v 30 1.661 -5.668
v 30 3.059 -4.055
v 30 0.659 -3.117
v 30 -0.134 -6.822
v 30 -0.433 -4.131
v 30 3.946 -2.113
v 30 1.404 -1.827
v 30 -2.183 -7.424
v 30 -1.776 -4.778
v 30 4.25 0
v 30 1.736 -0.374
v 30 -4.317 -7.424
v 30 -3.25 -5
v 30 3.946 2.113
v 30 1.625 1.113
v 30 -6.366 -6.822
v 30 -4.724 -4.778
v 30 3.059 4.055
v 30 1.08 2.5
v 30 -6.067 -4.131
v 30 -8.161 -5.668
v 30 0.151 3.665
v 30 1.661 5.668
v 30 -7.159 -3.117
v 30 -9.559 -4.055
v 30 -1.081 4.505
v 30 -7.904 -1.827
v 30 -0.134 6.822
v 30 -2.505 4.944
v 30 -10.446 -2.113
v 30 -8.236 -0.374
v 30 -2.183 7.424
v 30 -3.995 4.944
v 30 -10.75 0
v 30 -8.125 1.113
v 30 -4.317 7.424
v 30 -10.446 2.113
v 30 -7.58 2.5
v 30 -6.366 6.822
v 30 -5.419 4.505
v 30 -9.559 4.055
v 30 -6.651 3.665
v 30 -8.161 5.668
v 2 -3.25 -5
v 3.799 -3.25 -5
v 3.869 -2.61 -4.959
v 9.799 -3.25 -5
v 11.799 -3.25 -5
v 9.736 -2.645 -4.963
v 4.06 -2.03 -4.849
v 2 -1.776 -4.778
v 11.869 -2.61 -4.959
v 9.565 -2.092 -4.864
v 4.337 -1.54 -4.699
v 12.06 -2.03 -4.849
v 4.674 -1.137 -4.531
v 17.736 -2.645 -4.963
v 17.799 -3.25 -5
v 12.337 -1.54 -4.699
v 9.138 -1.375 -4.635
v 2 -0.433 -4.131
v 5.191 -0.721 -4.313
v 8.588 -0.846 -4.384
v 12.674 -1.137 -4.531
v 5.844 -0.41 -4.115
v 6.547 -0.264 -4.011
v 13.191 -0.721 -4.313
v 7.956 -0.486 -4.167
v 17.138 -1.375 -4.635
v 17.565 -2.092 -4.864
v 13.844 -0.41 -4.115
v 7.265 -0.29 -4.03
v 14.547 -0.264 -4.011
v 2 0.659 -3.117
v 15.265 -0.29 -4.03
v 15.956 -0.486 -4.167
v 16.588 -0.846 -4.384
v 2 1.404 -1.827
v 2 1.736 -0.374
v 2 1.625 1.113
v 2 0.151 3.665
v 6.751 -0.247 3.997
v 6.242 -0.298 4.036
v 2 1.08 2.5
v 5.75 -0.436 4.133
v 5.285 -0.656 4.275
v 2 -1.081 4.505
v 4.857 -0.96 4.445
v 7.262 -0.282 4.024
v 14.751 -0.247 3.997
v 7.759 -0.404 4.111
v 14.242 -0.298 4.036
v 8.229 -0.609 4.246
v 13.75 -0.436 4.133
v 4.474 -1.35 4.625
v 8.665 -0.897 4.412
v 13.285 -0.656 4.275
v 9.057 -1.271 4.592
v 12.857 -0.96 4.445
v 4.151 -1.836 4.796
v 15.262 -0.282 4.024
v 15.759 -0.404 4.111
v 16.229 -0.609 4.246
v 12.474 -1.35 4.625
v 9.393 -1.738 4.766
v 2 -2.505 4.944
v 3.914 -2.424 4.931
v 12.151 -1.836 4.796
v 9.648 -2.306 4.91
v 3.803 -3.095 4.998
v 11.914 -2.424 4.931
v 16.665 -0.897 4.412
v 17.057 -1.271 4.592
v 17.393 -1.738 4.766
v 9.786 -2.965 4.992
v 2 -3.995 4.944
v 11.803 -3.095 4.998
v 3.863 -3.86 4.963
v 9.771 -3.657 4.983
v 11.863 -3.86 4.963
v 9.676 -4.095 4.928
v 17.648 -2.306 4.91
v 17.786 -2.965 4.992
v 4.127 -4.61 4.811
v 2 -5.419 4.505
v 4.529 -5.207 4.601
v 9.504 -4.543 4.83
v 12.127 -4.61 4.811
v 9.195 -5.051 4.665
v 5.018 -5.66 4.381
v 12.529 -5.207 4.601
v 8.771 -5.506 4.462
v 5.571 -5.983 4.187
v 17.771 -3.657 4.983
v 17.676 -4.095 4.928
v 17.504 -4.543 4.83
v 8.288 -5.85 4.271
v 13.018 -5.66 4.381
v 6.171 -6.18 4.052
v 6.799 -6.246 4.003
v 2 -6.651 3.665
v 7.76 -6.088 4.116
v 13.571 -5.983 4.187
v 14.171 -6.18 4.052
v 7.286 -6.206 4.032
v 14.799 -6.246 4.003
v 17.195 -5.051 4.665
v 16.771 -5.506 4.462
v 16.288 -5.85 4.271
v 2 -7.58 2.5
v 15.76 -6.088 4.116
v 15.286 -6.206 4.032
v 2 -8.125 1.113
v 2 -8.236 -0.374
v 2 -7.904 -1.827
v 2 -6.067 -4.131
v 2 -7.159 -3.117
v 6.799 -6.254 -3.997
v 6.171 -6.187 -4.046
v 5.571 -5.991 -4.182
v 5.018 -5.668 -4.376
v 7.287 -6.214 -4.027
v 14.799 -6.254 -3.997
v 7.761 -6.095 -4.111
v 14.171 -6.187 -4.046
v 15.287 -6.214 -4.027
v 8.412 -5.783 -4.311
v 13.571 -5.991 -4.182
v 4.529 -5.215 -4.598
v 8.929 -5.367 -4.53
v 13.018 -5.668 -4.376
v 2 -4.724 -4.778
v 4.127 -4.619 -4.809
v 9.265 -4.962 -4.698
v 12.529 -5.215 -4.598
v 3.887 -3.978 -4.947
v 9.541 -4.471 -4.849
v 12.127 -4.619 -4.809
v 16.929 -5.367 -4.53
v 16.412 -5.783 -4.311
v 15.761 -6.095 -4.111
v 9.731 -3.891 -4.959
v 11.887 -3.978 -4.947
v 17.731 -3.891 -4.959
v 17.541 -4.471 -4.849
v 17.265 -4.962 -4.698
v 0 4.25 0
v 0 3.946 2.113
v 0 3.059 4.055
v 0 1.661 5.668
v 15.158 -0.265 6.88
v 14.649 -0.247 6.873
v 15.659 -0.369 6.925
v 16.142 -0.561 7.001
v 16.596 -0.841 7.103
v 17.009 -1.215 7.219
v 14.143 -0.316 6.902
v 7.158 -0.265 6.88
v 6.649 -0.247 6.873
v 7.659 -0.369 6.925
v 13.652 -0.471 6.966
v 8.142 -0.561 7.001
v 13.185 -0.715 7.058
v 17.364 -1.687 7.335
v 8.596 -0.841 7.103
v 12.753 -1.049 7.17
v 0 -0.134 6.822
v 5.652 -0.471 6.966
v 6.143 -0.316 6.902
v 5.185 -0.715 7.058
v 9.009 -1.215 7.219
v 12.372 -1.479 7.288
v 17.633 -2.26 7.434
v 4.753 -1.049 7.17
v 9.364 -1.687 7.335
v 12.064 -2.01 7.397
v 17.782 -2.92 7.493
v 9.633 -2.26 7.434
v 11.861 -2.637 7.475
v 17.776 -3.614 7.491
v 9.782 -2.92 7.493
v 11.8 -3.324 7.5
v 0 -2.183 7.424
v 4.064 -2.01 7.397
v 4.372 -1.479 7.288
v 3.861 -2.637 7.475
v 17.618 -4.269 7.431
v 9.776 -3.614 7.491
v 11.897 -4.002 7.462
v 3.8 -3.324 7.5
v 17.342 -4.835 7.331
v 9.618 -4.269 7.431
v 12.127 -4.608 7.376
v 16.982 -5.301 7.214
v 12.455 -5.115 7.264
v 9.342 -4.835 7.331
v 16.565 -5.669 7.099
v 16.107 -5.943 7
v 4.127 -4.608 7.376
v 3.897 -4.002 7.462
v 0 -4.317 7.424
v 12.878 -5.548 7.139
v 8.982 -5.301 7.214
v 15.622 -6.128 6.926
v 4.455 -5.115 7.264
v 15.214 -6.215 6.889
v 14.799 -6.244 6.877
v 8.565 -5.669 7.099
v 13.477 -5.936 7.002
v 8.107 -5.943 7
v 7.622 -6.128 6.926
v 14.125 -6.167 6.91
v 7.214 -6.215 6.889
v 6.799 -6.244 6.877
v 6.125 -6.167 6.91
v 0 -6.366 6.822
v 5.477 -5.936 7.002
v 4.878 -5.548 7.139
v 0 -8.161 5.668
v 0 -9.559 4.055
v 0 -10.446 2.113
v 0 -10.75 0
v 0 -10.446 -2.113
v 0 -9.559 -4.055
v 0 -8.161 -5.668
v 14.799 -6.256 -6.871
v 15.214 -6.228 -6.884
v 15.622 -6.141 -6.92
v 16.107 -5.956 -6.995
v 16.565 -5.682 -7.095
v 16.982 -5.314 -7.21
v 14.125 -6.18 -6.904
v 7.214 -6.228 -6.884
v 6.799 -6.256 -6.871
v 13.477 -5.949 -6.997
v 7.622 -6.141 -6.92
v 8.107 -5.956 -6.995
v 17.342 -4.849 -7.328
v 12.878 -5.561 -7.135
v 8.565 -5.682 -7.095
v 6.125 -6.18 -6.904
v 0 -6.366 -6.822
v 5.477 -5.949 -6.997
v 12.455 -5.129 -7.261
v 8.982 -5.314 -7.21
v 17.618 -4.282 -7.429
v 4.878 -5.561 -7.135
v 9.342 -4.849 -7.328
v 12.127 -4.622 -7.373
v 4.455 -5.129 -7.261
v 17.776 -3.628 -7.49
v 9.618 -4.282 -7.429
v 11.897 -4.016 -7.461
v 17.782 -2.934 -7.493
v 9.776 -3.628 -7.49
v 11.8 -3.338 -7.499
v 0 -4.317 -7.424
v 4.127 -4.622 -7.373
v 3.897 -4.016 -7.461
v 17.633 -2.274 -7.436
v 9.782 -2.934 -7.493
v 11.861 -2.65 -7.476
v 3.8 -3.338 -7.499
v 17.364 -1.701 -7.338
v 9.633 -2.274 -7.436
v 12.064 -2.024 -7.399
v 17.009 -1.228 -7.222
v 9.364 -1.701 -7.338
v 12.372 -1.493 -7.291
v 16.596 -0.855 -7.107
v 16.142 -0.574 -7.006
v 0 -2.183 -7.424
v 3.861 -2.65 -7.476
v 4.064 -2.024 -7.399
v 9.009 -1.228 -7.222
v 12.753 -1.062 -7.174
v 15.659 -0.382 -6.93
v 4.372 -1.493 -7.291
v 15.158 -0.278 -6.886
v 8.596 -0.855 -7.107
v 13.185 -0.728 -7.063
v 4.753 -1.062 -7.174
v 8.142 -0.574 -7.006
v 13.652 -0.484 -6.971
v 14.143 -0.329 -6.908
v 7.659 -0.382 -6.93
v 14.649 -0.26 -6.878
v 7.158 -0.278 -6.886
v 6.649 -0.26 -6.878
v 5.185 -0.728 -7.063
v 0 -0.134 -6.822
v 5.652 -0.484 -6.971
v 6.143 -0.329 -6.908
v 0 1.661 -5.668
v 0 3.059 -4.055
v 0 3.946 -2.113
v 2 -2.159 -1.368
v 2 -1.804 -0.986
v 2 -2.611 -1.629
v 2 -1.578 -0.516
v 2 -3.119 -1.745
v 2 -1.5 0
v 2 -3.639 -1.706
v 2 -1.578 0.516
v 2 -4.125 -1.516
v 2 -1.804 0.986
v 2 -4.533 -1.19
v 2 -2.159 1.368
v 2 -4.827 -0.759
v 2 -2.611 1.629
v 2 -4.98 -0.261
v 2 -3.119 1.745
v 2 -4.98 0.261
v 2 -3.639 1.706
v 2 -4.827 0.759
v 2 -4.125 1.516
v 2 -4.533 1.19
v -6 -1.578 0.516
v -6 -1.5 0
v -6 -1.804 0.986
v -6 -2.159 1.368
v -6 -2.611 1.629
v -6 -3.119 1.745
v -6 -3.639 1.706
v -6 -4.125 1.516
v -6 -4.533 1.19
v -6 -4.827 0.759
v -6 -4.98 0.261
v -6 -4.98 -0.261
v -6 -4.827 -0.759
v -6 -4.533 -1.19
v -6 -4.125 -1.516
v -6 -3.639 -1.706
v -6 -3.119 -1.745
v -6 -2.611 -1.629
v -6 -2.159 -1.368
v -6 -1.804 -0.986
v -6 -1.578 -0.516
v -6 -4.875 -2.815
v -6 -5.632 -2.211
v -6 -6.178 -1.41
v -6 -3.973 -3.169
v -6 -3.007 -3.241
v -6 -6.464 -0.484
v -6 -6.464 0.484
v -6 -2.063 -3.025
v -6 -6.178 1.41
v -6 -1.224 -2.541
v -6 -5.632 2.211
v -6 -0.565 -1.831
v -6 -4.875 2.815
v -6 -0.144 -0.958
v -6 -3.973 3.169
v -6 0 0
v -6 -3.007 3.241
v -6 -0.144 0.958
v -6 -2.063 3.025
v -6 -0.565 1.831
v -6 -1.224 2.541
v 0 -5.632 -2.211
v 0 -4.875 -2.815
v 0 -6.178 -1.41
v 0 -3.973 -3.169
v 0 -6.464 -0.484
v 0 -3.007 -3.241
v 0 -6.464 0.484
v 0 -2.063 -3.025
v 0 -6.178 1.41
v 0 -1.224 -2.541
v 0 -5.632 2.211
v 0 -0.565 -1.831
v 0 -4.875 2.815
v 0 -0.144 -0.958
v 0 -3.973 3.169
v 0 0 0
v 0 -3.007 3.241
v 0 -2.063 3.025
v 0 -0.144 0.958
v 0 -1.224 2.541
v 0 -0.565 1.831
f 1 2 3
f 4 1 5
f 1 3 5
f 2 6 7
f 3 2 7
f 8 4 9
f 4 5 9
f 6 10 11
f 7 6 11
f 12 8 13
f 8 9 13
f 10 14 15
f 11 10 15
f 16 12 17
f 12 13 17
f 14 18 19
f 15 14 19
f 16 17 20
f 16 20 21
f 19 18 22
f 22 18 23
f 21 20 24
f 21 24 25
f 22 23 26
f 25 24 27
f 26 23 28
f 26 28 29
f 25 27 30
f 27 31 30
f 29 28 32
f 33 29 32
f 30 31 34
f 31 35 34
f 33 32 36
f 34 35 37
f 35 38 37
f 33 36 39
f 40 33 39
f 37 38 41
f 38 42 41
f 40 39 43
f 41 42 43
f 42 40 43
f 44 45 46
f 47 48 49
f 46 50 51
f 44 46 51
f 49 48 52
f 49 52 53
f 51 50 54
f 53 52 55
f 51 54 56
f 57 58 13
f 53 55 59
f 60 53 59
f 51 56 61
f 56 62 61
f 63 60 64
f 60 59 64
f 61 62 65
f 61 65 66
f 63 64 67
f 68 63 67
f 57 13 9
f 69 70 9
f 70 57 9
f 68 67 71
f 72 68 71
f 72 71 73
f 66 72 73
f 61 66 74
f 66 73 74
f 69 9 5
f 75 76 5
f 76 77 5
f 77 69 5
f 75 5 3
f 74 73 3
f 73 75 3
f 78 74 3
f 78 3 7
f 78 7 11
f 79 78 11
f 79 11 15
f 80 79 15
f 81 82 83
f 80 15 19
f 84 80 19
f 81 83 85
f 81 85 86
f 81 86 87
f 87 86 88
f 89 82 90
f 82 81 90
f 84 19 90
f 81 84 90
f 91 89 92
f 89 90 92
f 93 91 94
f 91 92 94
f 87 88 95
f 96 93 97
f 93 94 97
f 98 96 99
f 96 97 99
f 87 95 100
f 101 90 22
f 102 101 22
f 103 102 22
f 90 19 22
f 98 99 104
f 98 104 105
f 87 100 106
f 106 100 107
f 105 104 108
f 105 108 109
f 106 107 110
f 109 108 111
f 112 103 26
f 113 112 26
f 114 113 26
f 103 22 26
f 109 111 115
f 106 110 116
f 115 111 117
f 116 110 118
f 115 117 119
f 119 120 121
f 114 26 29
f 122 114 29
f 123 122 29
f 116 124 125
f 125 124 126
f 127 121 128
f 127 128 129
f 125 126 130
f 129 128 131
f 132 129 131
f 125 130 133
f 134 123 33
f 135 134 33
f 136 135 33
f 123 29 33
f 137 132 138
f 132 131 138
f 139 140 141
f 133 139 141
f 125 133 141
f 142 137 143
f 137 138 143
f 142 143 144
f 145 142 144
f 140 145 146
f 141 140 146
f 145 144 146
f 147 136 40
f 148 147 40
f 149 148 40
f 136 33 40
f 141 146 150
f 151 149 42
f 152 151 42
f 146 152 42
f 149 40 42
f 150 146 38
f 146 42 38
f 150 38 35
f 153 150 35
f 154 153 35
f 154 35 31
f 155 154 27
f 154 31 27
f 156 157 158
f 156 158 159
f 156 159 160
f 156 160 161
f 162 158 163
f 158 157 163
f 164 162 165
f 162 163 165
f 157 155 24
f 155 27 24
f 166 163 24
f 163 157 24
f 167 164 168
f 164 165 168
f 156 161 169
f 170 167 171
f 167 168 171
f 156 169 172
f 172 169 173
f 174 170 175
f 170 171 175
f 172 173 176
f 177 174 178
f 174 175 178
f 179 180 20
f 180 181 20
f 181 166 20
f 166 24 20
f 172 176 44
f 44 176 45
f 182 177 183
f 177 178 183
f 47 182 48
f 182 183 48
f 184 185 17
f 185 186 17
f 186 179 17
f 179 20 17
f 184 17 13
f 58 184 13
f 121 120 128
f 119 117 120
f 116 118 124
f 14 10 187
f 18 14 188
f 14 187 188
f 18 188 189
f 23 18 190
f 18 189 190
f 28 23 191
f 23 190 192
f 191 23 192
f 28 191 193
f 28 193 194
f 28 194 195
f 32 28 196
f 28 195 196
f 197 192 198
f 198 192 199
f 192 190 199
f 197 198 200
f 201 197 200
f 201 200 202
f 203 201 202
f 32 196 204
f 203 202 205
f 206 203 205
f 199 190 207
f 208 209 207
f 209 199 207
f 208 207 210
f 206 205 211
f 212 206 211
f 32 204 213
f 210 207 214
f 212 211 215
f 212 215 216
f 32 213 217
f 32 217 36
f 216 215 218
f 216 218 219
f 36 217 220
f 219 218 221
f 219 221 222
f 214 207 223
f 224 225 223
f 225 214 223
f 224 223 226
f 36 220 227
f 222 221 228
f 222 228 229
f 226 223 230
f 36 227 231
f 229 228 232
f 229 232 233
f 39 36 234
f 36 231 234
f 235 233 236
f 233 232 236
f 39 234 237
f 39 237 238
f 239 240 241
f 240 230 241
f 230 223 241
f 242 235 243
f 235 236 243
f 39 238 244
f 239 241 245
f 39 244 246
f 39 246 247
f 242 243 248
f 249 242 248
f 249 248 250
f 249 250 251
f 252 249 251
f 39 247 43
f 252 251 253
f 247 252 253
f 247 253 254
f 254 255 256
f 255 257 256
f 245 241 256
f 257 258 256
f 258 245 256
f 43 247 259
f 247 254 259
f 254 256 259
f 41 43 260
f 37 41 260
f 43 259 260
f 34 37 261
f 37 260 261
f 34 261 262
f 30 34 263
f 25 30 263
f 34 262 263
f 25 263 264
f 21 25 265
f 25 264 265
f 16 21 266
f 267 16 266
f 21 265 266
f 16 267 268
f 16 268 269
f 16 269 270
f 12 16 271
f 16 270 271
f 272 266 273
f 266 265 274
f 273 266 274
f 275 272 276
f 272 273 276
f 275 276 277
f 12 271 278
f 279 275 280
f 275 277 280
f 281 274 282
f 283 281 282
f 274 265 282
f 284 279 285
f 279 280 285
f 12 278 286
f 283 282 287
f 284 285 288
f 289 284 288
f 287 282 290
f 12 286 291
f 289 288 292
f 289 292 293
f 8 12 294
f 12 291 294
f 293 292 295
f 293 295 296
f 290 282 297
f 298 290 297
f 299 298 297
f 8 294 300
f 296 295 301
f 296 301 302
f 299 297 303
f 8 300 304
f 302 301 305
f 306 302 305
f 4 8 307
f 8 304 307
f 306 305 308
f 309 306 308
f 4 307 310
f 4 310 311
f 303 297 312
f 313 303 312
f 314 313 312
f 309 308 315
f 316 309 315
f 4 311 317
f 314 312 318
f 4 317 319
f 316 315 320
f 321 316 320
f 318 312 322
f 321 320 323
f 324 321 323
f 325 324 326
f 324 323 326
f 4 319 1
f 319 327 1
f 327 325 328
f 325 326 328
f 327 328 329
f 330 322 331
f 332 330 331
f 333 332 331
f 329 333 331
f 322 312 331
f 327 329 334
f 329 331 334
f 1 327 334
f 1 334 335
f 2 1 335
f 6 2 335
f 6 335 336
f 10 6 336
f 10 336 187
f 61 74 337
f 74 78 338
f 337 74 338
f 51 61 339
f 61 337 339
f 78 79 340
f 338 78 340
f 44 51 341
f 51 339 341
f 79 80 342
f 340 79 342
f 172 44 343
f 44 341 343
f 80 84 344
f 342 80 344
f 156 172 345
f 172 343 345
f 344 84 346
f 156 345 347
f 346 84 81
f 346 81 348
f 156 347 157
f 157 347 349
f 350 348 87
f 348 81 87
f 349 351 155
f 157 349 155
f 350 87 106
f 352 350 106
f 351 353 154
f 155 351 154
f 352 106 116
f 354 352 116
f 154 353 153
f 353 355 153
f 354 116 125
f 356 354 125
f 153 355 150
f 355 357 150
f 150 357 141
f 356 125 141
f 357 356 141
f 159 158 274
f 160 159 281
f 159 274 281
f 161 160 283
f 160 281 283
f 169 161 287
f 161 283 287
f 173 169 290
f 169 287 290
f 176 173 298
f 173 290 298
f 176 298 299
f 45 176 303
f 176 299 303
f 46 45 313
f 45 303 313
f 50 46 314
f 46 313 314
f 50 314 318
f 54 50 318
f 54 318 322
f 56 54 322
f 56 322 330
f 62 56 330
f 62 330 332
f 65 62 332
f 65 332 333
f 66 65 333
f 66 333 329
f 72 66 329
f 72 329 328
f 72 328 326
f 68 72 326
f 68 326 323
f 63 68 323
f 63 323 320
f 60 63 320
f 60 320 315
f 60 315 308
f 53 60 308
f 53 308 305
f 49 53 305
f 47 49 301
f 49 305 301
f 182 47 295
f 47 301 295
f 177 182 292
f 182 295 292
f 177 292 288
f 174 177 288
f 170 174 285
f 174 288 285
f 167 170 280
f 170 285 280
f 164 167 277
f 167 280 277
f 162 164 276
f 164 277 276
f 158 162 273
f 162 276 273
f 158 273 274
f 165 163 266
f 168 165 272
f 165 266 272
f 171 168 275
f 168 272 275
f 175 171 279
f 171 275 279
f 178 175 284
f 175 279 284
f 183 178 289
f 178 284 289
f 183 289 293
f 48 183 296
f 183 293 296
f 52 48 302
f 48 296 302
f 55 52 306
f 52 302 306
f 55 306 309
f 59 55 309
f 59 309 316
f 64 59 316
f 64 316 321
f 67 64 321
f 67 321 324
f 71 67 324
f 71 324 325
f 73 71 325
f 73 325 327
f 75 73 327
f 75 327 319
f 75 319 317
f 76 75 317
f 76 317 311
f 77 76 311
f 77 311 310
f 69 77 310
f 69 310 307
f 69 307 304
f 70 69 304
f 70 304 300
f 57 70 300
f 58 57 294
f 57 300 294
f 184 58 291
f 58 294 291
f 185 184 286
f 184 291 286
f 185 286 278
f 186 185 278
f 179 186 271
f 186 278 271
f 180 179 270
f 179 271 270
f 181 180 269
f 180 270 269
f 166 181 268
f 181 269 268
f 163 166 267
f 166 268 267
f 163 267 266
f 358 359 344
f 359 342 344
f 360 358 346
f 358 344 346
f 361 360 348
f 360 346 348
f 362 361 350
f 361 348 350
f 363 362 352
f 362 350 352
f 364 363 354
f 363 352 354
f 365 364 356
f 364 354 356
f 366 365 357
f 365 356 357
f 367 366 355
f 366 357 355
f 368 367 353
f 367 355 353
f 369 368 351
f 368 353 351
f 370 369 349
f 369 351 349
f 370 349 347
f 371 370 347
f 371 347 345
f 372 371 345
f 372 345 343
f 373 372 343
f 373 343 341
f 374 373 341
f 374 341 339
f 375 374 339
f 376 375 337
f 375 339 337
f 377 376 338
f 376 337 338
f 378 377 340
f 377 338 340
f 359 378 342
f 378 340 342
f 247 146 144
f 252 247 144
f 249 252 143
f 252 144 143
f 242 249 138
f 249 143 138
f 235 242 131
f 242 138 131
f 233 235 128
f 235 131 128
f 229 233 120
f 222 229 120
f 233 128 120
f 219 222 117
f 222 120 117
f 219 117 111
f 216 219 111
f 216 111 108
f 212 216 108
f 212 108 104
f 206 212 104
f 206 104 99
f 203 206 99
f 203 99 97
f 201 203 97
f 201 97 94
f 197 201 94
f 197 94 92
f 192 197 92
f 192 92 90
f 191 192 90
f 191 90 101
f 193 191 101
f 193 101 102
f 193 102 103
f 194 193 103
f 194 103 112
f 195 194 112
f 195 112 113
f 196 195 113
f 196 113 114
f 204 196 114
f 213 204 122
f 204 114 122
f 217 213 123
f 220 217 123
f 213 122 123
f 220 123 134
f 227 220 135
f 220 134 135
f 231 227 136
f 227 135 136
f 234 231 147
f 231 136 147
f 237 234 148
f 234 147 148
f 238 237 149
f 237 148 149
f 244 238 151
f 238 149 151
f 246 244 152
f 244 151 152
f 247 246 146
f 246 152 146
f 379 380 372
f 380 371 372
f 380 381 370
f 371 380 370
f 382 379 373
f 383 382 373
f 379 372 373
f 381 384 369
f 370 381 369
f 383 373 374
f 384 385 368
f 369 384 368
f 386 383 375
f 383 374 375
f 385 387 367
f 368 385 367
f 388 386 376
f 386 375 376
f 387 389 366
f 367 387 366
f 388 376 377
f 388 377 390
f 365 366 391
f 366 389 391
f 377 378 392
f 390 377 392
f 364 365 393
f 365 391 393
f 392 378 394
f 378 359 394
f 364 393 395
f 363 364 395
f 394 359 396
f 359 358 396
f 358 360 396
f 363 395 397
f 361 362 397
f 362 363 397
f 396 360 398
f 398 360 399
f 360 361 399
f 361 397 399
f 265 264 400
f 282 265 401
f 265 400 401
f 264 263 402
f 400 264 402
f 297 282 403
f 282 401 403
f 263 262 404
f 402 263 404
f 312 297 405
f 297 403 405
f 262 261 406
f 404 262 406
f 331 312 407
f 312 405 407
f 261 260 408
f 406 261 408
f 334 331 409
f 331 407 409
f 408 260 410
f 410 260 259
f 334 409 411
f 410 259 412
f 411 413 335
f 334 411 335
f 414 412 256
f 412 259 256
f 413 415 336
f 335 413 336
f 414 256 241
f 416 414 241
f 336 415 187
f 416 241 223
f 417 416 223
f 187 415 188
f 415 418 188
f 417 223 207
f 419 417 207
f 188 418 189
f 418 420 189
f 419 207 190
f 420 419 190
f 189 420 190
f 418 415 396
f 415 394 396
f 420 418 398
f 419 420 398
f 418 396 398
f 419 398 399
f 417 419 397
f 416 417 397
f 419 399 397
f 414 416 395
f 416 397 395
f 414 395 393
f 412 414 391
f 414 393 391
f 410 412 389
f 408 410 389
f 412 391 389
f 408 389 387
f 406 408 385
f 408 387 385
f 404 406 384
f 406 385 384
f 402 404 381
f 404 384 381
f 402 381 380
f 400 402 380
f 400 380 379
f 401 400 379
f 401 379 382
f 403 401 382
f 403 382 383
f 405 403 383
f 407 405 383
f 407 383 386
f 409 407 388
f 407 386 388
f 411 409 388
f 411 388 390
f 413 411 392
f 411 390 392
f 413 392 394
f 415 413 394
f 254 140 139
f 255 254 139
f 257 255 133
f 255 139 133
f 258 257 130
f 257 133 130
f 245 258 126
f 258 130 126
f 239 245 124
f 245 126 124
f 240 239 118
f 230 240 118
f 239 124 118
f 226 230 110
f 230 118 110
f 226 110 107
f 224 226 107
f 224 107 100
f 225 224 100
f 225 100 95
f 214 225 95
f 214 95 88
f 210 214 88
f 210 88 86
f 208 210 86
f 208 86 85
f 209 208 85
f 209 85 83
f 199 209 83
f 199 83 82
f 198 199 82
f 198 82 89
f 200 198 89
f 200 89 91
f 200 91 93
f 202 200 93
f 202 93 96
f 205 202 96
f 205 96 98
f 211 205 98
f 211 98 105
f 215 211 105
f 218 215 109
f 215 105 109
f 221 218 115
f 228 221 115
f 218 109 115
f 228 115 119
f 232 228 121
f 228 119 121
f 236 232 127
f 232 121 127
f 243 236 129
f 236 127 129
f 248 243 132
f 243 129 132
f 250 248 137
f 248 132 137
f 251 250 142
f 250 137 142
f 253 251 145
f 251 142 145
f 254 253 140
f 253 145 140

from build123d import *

# Parameters (mm, degrees)
F_6_0_6_DIAMETER_HOLE3_D           = 6
F_6_0_6_DIAMETER_HOLE3_ON_FACE_2_D = 6
SKETCH7_R                          = 5
CUT_EXTRUDE1_DEPTH                 = 28


with BuildPart() as part:
    # Sketch1 → Revolve2 (revolve)
    with BuildSketch(Plane.XY):
        Polygon((0, 0), (-6, 0), (-6, -1.5), (2, -1.5), (2, 0.25), (28, 0.25), (28, -3.25), (30, -3.25), (30, 4.25), (0, 4.25), align=None)
    revolve(axis=Axis((-6, -3.25, 0), (1, 0, 0)))

    # Ø6.0 (6) Diameter Hole3 (through all)
    with Locations(Plane(origin=(6.798989942, -3.243014935, 7.499996747), x_dir=(0, 0.999999566, -0.000931342), z_dir=(0, 0.000931342, 0.999999566))):
        with Locations((0, 0)):
            Hole(F_6_0_6_DIAMETER_HOLE3_D / 2)

    # Ø6.0 (6) Diameter Hole3 on face 2 (through all)
    with Locations(Plane(origin=(14.798989942, -3.243014935, 7.499996747), x_dir=(0, 0.999999567, -0.000931), z_dir=(0, 0.000931, 0.999999567))):
        with Locations((0, 0)):
            Hole(F_6_0_6_DIAMETER_HOLE3_ON_FACE_2_D / 2)

    # Sketch7 → Cut-Extrude1 (cut)
    with BuildSketch(Plane(origin=(30, 0, 0), x_dir=(0, 0, -1), z_dir=(1, 0, 0))):
        with Locations((0, -3.25)):
            Circle(SKETCH7_R)
    extrude(amount=-CUT_EXTRUDE1_DEPTH, mode=Mode.SUBTRACT)


solid = part.part
